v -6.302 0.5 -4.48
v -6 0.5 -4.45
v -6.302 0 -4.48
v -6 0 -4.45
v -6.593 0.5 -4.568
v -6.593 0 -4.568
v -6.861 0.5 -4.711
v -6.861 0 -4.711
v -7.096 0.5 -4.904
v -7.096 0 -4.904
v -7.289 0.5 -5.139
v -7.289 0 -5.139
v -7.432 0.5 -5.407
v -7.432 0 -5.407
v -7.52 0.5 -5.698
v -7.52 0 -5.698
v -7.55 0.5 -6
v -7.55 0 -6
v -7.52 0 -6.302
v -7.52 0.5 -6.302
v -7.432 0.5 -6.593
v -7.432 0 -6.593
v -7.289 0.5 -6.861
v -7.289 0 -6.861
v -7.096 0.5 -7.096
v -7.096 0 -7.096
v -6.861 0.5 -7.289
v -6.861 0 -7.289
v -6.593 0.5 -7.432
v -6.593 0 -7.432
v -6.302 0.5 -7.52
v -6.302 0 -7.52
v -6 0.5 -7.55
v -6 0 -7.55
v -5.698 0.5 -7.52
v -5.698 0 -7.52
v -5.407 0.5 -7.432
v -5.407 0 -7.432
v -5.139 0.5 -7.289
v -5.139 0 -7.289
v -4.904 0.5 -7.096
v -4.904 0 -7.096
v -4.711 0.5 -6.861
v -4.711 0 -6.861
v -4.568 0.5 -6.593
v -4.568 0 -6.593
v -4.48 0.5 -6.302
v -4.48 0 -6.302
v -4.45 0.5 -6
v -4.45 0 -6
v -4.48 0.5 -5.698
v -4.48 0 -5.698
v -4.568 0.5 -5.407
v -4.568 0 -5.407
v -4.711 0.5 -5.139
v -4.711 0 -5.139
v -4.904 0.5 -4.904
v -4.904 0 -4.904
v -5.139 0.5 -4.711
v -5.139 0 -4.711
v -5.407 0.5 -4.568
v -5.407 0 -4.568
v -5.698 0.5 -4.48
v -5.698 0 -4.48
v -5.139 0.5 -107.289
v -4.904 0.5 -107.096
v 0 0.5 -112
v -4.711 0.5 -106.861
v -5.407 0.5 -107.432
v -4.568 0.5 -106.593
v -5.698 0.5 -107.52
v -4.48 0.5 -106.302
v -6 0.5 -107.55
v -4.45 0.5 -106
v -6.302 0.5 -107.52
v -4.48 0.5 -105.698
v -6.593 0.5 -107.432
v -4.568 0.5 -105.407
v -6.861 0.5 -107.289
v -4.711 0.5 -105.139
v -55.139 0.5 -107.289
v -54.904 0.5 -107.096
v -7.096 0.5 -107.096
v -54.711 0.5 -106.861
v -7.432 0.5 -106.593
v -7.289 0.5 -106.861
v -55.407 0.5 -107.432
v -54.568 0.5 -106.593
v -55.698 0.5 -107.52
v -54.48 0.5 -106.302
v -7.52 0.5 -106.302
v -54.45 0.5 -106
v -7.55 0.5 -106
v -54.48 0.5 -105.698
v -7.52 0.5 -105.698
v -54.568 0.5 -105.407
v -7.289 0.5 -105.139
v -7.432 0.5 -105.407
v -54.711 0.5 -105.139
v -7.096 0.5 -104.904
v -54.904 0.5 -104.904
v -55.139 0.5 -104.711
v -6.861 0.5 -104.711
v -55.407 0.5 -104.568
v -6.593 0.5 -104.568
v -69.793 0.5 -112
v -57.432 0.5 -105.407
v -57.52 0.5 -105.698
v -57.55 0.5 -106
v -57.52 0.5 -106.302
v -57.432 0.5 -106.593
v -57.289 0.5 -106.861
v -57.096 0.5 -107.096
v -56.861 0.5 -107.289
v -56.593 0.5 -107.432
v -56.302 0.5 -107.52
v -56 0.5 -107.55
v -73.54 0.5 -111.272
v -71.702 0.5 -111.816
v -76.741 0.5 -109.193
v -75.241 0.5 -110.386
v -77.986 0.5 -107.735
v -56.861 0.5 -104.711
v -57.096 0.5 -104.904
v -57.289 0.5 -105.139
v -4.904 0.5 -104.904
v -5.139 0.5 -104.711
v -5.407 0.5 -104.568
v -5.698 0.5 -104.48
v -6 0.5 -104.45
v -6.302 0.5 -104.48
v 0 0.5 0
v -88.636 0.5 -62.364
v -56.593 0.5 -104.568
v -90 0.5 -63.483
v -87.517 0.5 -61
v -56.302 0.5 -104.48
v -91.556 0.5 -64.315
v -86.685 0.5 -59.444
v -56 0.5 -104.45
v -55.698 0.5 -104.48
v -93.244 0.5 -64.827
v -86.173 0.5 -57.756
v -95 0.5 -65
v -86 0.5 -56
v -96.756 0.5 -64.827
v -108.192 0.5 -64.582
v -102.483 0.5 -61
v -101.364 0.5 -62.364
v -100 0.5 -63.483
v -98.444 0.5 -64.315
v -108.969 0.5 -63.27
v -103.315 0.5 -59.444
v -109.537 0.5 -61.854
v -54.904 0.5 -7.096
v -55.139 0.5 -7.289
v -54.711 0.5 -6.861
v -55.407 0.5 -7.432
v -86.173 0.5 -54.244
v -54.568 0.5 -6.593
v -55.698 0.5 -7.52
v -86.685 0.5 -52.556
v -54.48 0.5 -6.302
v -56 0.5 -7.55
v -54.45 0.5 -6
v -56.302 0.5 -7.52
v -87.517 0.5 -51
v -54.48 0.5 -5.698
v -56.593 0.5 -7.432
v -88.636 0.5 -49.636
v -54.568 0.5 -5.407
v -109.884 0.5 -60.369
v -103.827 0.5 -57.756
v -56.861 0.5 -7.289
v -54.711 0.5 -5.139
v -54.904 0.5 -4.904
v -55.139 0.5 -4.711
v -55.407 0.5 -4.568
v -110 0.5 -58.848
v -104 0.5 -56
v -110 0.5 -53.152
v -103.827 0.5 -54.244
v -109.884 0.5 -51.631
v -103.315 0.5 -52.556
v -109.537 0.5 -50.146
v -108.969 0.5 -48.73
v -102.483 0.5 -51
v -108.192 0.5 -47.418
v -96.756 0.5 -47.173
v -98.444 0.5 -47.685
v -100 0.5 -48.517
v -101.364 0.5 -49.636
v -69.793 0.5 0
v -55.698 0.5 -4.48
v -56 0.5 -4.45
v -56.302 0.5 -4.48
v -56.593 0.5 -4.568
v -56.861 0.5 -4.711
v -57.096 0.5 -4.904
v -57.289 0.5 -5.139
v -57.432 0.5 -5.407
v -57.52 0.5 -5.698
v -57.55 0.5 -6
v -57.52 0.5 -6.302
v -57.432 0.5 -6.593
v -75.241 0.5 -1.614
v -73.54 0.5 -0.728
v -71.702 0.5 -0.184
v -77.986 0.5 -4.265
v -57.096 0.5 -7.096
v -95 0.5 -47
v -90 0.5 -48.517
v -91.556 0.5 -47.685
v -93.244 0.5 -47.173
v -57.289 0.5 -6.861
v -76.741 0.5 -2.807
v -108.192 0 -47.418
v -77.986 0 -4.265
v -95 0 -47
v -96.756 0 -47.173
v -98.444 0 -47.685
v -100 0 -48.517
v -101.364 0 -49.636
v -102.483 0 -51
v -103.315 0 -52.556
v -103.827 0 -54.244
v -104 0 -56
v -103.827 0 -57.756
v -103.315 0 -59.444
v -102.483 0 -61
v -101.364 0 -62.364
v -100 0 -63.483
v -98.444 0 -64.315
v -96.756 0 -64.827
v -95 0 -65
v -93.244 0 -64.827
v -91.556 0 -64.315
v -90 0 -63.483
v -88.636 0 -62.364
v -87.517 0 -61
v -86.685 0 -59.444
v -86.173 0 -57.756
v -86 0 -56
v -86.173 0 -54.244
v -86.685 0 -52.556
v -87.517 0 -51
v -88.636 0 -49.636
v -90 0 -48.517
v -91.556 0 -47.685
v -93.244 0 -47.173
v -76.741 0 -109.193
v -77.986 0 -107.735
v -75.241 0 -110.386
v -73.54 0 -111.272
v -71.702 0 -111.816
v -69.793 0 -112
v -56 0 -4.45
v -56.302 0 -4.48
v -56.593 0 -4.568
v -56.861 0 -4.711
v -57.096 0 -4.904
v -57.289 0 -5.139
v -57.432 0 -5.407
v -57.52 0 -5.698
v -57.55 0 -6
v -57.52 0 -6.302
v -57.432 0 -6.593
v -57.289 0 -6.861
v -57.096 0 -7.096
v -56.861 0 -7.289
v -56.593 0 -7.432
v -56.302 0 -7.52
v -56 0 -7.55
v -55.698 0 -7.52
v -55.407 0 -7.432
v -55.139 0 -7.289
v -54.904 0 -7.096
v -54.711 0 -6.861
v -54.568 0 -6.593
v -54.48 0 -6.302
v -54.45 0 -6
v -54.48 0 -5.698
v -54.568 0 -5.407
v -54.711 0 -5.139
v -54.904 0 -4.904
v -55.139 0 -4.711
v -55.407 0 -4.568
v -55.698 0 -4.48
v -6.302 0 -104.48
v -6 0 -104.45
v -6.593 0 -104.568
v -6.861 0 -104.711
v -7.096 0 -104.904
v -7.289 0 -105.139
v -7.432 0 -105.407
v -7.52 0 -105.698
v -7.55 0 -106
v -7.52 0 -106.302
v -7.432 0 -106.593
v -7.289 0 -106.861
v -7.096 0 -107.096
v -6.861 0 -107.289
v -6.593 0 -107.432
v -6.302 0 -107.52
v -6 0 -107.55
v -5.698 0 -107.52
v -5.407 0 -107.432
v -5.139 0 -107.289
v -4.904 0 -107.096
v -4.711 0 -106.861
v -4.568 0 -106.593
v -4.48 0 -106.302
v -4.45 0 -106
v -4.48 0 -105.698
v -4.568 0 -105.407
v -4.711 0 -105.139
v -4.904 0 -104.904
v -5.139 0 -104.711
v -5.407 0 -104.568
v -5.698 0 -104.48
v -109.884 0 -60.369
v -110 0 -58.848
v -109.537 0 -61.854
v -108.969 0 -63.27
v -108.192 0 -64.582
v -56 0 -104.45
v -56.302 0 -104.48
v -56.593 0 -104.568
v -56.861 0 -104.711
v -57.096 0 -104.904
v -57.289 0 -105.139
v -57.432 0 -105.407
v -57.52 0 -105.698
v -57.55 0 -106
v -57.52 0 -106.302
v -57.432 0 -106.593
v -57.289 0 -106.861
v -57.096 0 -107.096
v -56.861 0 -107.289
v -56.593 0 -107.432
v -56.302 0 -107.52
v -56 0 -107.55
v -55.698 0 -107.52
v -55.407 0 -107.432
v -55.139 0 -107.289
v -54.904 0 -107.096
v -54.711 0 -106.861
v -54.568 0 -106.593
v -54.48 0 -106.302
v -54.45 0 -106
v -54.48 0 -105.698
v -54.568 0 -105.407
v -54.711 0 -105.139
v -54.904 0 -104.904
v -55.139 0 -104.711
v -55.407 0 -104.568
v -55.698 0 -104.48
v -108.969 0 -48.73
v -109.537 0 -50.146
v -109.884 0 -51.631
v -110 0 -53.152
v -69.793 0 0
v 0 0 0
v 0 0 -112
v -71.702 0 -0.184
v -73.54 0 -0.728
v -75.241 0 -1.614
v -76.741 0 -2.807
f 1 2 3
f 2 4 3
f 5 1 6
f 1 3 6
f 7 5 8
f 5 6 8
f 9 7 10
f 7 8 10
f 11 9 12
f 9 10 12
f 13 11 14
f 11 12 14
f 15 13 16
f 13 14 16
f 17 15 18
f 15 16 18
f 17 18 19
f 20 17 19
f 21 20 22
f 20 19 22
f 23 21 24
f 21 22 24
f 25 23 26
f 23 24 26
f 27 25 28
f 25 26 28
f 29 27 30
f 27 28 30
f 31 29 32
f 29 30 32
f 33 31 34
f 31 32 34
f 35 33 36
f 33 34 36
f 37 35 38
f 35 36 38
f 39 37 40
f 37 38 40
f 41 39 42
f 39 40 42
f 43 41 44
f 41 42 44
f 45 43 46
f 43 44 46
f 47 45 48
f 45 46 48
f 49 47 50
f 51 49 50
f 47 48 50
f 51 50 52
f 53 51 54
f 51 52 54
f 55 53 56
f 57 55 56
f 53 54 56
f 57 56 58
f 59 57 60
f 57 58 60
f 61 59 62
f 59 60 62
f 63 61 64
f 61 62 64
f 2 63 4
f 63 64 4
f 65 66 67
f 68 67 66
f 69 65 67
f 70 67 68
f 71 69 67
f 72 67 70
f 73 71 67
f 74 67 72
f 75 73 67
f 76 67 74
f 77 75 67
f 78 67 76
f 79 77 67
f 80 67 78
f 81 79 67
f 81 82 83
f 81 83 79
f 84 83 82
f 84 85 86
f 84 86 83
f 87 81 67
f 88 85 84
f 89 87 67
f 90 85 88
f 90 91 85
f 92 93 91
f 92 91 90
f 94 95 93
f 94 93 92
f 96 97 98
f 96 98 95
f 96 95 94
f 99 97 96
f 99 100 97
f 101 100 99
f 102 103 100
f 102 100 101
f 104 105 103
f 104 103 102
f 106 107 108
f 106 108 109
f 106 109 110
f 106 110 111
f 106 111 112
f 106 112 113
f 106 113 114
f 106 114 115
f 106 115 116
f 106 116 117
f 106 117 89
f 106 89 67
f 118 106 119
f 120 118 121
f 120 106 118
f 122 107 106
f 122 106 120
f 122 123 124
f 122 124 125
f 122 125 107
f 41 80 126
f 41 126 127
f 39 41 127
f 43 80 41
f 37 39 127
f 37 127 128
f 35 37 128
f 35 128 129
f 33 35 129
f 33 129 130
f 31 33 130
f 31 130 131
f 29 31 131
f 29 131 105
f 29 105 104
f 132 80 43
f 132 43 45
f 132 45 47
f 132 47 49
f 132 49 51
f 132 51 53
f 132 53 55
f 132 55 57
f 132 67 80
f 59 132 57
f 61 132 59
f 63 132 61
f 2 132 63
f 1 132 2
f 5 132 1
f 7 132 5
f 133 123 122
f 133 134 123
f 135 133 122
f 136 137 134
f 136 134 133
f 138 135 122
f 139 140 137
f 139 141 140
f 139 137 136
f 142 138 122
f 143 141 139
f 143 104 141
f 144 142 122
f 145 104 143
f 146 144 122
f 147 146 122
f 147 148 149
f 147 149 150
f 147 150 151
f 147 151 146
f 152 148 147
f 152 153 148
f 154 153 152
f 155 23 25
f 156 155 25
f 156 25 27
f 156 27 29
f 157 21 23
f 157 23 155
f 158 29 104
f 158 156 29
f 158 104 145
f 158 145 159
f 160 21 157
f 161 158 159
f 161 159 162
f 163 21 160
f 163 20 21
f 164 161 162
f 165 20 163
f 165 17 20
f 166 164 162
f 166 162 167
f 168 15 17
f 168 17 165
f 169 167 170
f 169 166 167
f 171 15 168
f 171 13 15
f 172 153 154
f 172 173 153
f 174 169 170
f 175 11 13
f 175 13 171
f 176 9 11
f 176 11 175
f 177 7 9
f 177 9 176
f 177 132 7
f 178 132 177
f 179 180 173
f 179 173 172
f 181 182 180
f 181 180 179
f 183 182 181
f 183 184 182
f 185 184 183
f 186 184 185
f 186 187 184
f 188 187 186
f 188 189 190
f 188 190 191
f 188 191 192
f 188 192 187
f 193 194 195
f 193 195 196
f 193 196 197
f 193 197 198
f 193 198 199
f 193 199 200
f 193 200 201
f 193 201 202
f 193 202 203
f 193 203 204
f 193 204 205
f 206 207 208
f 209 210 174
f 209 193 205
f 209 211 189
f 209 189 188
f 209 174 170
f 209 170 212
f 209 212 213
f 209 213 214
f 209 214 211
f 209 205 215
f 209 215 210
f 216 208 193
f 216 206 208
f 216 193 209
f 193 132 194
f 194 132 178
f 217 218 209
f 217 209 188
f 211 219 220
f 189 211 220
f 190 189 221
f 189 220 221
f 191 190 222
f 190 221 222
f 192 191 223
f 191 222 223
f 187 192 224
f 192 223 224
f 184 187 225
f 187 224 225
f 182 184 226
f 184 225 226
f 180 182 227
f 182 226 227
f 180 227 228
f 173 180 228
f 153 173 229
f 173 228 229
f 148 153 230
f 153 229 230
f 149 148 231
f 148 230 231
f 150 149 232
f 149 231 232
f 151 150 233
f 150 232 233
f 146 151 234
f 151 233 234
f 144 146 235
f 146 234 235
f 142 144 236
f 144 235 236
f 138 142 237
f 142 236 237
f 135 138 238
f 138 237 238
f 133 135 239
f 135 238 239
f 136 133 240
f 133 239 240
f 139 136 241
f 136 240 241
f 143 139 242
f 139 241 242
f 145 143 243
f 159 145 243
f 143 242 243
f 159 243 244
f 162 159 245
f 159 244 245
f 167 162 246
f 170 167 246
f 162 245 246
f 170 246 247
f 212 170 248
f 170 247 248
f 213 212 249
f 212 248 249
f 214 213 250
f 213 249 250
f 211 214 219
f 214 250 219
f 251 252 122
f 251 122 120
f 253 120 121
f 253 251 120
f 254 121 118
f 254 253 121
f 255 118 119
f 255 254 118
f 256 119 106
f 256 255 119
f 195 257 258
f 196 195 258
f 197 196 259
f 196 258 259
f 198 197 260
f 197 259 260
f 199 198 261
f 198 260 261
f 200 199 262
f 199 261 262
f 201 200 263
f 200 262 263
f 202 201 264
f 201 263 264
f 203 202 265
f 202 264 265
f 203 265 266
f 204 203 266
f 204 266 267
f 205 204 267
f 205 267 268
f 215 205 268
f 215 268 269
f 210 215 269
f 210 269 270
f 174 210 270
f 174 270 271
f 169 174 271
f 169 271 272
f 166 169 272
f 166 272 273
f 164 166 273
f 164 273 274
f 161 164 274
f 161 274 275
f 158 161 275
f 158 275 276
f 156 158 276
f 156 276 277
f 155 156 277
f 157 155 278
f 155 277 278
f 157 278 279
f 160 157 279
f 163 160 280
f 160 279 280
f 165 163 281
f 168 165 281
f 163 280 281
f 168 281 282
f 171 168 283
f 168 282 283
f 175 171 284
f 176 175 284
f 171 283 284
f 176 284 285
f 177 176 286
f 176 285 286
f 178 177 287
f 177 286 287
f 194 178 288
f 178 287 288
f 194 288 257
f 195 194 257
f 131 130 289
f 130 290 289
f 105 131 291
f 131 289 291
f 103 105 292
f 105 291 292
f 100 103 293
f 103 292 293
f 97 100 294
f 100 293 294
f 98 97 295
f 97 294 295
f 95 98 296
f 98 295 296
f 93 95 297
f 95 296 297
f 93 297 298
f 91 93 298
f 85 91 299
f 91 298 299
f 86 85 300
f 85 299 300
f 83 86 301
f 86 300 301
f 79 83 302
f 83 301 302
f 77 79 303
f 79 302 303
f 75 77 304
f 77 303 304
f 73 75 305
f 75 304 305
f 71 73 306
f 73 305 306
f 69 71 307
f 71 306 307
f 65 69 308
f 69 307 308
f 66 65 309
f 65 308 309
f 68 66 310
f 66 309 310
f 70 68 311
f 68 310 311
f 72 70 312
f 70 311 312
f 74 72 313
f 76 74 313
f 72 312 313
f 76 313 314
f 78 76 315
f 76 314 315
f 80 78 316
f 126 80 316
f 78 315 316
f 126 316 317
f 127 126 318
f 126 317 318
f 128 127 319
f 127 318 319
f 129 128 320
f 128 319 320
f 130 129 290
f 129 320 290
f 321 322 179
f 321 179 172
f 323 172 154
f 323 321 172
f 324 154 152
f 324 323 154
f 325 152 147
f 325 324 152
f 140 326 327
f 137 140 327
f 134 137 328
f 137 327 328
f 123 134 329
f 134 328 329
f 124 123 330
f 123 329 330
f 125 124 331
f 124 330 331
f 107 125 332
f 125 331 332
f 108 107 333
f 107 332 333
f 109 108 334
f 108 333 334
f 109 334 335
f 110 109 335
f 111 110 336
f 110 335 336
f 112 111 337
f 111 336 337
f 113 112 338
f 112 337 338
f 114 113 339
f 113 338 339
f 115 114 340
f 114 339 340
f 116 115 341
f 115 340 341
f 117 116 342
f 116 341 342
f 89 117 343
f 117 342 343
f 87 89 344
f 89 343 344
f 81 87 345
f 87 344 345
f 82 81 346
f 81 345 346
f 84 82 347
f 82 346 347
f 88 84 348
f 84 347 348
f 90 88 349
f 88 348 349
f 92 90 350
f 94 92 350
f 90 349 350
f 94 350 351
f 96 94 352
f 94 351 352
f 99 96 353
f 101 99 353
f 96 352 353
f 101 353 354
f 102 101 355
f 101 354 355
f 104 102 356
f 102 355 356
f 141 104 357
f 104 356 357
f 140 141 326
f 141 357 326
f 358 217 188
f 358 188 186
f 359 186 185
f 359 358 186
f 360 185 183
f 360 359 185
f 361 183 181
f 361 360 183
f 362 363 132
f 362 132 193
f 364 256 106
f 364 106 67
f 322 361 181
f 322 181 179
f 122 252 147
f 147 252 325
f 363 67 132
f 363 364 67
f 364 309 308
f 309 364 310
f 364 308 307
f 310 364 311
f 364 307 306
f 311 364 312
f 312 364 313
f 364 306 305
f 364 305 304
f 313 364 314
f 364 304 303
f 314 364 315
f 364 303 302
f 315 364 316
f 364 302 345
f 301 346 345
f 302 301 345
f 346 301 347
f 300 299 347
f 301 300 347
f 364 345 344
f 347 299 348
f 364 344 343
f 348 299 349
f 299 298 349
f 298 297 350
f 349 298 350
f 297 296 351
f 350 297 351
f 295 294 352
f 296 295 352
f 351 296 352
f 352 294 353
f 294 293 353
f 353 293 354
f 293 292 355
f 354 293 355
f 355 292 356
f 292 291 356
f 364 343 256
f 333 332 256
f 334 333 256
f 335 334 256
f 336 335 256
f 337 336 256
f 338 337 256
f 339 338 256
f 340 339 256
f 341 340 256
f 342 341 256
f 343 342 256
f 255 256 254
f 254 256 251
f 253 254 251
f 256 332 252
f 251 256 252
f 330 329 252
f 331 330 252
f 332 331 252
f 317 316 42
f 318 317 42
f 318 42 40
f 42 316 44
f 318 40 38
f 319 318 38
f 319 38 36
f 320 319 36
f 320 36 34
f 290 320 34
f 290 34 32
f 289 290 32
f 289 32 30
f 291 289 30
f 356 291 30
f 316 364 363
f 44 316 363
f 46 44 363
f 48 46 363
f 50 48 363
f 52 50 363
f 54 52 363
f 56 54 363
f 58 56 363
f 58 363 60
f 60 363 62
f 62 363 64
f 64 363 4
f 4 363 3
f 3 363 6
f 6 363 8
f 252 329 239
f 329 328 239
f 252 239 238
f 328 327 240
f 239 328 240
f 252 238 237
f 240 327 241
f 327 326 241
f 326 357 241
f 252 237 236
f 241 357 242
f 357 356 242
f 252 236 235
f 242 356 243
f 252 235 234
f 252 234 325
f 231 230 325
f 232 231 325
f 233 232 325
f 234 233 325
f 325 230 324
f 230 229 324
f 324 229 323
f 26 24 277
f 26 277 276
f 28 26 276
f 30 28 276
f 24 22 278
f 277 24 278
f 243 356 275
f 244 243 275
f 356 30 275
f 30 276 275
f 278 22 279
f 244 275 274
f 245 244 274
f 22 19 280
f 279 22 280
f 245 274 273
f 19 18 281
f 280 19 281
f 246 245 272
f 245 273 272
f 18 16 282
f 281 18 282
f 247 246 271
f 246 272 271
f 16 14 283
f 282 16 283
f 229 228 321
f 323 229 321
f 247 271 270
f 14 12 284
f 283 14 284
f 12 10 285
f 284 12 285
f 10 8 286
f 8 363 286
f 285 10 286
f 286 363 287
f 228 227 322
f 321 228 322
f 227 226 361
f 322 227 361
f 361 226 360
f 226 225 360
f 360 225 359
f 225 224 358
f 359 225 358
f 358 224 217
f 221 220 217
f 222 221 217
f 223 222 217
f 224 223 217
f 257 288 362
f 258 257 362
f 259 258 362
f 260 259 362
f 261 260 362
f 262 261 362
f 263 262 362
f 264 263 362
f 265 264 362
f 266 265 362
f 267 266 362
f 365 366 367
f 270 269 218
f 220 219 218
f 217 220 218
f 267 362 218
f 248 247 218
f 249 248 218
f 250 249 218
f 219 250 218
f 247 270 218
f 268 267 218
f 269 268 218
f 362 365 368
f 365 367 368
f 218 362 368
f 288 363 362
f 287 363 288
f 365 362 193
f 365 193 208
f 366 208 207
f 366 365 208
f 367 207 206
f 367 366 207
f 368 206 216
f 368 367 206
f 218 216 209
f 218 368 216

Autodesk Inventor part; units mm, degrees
ref_plane "YZ Plane" through (0, 0, 0) normal (1, 0, 0) x (0, 1, 0)
ref_plane "XZ Plane" through (0, 0, 0) normal (0, 1, 0) x (-1, 0, 0)
ref_plane "XY Plane" through (0, 0, 0) normal (0, 0, 1) x (1, 0, 0)
sketch "Sketch2" plane through (0, 0, 0) normal (0, 1, 0) x (-1, 0, 0)
  line L0 (0, 0) -> (69.7934, 0)
  line L1 (110, -53.1522) -> (110, -58.8478)
  line L2 (69.7934, -112) -> (0, -112)
  line L3 (0, -112) -> (0, 0)
  line L4 (77.9858, -4.2654) -> (108.1923, -47.4176)
  line L5 (77.9858, -107.7346) -> (108.1923, -64.5824)
  arc A0 (110, -53.1522) -> (108.1923, -47.4176) centre (100, -53.1522) ccw
  arc A1 (108.1923, -64.5824) -> (110, -58.8478) centre (100, -58.8478) ccw
  arc A2 (77.9858, -4.2654) -> (69.7934, 0) centre (69.7934, -10) ccw
  arc A3 (69.7934, -112) -> (77.9858, -107.7346) centre (69.7934, -102) ccw
  point P0 (110, -112)
  point P1 (110, 0)
  point P2 (75, 0)
  point P3 (110, -50)
  point P4 (75, -112)
  point P5 (110, -62)
  dimension "d10" = 110
  dimension "d11" = 112
  dimension "d34" = 35
  dimension "d35" = 50
  dimension "d36" = 35
  dimension "d37" = 50
  dimension "d38" = 10
extrude "Plate1" add sketch "Sketch2" along normal blind 0.5
sketch "Sketch3" plane through (0, 0.5, 0) normal (0, 1, 0) x (1, 0, 0)
  line L0 (0, 0) -> (-69.7934, 0) projected
  line L1 (-69.7934, 112) -> (0, 112) projected
  line L2 (0, 112) -> (0, 0) projected
  circle A0 centre (-6, 6) radius 1.55
  line L3 (0, 59.1522) -> (-110, 59.1522) construction
  line L4 (-110, 53.1522) -> (-110, 58.8478) projected
  line L5 (-6, 0) -> (-6, 112) construction
  circle A1 centre (-6, 106) radius 1.55
  circle A2 centre (-56, 6) radius 1.55
  circle A3 centre (-56, 106) radius 1.55
  point P0 (-62, 0)
  point P1 (-62, 112)
  point P2 (-110, 58.8478)
  dimension "d16" = 3.1
  dimension "d17" = 6
  dimension "d18" = 6
  dimension "d21" = 100
  dimension "d24" = 50
hole "Hole1" at (-56, 0.5, -6) at (-6, 0.5, -6) at (-6, 0.5, -106) at (-56, 0.5, -106) direction (0, -1, 0) diameter 3.1 end through all
sketch "Sketch4" plane through (0, 0.5, 0) normal (0, 1, 0) x (1, 0, 0)
  circle A0 centre (-56, 6) radius 1.55 projected
  circle A1 centre (-56, 106) radius 1.55 projected
  line L0 (-56, 6) -> (-56, 106) construction
  line L1 (-56, 106) -> (-56, 56)
  line L2 (-56, 56) -> (-110, 56) construction
  line L3 (-110, 53.1522) -> (-110, 58.8478) projected
  circle A2 centre (-95, 56) radius 9
  line L4 (-110, 53.1522) -> (-110, 58.8478) projected
  point P0 (0, 0)
  dimension "d39" = 18
  dimension "d40" = 15
hole "Hole2" at (-95, 0.5, -56) direction (0, -1, 0) diameter 18 end through all
equation "\"d32\" = Thickness"
equation "\"d36\" = d34"
equation "\"BendRadius\" = Thickness"
equation "\"BendReliefWidth\" = Thickness"
equation "\"BendReliefDepth\" = 0.5 * Thickness"
equation "\"CornerReliefSize\" = 4 * Thickness"
equation "\"MinimumRemnant\" = 2 * Thickness"
equation "\"TransitionRadius\" = BendRadius"
equation "\"JacobiRadiusSize\" = BendRadius"
equation "\"GapSize\" = Thickness"
properties part number "Sketch-3-44"
